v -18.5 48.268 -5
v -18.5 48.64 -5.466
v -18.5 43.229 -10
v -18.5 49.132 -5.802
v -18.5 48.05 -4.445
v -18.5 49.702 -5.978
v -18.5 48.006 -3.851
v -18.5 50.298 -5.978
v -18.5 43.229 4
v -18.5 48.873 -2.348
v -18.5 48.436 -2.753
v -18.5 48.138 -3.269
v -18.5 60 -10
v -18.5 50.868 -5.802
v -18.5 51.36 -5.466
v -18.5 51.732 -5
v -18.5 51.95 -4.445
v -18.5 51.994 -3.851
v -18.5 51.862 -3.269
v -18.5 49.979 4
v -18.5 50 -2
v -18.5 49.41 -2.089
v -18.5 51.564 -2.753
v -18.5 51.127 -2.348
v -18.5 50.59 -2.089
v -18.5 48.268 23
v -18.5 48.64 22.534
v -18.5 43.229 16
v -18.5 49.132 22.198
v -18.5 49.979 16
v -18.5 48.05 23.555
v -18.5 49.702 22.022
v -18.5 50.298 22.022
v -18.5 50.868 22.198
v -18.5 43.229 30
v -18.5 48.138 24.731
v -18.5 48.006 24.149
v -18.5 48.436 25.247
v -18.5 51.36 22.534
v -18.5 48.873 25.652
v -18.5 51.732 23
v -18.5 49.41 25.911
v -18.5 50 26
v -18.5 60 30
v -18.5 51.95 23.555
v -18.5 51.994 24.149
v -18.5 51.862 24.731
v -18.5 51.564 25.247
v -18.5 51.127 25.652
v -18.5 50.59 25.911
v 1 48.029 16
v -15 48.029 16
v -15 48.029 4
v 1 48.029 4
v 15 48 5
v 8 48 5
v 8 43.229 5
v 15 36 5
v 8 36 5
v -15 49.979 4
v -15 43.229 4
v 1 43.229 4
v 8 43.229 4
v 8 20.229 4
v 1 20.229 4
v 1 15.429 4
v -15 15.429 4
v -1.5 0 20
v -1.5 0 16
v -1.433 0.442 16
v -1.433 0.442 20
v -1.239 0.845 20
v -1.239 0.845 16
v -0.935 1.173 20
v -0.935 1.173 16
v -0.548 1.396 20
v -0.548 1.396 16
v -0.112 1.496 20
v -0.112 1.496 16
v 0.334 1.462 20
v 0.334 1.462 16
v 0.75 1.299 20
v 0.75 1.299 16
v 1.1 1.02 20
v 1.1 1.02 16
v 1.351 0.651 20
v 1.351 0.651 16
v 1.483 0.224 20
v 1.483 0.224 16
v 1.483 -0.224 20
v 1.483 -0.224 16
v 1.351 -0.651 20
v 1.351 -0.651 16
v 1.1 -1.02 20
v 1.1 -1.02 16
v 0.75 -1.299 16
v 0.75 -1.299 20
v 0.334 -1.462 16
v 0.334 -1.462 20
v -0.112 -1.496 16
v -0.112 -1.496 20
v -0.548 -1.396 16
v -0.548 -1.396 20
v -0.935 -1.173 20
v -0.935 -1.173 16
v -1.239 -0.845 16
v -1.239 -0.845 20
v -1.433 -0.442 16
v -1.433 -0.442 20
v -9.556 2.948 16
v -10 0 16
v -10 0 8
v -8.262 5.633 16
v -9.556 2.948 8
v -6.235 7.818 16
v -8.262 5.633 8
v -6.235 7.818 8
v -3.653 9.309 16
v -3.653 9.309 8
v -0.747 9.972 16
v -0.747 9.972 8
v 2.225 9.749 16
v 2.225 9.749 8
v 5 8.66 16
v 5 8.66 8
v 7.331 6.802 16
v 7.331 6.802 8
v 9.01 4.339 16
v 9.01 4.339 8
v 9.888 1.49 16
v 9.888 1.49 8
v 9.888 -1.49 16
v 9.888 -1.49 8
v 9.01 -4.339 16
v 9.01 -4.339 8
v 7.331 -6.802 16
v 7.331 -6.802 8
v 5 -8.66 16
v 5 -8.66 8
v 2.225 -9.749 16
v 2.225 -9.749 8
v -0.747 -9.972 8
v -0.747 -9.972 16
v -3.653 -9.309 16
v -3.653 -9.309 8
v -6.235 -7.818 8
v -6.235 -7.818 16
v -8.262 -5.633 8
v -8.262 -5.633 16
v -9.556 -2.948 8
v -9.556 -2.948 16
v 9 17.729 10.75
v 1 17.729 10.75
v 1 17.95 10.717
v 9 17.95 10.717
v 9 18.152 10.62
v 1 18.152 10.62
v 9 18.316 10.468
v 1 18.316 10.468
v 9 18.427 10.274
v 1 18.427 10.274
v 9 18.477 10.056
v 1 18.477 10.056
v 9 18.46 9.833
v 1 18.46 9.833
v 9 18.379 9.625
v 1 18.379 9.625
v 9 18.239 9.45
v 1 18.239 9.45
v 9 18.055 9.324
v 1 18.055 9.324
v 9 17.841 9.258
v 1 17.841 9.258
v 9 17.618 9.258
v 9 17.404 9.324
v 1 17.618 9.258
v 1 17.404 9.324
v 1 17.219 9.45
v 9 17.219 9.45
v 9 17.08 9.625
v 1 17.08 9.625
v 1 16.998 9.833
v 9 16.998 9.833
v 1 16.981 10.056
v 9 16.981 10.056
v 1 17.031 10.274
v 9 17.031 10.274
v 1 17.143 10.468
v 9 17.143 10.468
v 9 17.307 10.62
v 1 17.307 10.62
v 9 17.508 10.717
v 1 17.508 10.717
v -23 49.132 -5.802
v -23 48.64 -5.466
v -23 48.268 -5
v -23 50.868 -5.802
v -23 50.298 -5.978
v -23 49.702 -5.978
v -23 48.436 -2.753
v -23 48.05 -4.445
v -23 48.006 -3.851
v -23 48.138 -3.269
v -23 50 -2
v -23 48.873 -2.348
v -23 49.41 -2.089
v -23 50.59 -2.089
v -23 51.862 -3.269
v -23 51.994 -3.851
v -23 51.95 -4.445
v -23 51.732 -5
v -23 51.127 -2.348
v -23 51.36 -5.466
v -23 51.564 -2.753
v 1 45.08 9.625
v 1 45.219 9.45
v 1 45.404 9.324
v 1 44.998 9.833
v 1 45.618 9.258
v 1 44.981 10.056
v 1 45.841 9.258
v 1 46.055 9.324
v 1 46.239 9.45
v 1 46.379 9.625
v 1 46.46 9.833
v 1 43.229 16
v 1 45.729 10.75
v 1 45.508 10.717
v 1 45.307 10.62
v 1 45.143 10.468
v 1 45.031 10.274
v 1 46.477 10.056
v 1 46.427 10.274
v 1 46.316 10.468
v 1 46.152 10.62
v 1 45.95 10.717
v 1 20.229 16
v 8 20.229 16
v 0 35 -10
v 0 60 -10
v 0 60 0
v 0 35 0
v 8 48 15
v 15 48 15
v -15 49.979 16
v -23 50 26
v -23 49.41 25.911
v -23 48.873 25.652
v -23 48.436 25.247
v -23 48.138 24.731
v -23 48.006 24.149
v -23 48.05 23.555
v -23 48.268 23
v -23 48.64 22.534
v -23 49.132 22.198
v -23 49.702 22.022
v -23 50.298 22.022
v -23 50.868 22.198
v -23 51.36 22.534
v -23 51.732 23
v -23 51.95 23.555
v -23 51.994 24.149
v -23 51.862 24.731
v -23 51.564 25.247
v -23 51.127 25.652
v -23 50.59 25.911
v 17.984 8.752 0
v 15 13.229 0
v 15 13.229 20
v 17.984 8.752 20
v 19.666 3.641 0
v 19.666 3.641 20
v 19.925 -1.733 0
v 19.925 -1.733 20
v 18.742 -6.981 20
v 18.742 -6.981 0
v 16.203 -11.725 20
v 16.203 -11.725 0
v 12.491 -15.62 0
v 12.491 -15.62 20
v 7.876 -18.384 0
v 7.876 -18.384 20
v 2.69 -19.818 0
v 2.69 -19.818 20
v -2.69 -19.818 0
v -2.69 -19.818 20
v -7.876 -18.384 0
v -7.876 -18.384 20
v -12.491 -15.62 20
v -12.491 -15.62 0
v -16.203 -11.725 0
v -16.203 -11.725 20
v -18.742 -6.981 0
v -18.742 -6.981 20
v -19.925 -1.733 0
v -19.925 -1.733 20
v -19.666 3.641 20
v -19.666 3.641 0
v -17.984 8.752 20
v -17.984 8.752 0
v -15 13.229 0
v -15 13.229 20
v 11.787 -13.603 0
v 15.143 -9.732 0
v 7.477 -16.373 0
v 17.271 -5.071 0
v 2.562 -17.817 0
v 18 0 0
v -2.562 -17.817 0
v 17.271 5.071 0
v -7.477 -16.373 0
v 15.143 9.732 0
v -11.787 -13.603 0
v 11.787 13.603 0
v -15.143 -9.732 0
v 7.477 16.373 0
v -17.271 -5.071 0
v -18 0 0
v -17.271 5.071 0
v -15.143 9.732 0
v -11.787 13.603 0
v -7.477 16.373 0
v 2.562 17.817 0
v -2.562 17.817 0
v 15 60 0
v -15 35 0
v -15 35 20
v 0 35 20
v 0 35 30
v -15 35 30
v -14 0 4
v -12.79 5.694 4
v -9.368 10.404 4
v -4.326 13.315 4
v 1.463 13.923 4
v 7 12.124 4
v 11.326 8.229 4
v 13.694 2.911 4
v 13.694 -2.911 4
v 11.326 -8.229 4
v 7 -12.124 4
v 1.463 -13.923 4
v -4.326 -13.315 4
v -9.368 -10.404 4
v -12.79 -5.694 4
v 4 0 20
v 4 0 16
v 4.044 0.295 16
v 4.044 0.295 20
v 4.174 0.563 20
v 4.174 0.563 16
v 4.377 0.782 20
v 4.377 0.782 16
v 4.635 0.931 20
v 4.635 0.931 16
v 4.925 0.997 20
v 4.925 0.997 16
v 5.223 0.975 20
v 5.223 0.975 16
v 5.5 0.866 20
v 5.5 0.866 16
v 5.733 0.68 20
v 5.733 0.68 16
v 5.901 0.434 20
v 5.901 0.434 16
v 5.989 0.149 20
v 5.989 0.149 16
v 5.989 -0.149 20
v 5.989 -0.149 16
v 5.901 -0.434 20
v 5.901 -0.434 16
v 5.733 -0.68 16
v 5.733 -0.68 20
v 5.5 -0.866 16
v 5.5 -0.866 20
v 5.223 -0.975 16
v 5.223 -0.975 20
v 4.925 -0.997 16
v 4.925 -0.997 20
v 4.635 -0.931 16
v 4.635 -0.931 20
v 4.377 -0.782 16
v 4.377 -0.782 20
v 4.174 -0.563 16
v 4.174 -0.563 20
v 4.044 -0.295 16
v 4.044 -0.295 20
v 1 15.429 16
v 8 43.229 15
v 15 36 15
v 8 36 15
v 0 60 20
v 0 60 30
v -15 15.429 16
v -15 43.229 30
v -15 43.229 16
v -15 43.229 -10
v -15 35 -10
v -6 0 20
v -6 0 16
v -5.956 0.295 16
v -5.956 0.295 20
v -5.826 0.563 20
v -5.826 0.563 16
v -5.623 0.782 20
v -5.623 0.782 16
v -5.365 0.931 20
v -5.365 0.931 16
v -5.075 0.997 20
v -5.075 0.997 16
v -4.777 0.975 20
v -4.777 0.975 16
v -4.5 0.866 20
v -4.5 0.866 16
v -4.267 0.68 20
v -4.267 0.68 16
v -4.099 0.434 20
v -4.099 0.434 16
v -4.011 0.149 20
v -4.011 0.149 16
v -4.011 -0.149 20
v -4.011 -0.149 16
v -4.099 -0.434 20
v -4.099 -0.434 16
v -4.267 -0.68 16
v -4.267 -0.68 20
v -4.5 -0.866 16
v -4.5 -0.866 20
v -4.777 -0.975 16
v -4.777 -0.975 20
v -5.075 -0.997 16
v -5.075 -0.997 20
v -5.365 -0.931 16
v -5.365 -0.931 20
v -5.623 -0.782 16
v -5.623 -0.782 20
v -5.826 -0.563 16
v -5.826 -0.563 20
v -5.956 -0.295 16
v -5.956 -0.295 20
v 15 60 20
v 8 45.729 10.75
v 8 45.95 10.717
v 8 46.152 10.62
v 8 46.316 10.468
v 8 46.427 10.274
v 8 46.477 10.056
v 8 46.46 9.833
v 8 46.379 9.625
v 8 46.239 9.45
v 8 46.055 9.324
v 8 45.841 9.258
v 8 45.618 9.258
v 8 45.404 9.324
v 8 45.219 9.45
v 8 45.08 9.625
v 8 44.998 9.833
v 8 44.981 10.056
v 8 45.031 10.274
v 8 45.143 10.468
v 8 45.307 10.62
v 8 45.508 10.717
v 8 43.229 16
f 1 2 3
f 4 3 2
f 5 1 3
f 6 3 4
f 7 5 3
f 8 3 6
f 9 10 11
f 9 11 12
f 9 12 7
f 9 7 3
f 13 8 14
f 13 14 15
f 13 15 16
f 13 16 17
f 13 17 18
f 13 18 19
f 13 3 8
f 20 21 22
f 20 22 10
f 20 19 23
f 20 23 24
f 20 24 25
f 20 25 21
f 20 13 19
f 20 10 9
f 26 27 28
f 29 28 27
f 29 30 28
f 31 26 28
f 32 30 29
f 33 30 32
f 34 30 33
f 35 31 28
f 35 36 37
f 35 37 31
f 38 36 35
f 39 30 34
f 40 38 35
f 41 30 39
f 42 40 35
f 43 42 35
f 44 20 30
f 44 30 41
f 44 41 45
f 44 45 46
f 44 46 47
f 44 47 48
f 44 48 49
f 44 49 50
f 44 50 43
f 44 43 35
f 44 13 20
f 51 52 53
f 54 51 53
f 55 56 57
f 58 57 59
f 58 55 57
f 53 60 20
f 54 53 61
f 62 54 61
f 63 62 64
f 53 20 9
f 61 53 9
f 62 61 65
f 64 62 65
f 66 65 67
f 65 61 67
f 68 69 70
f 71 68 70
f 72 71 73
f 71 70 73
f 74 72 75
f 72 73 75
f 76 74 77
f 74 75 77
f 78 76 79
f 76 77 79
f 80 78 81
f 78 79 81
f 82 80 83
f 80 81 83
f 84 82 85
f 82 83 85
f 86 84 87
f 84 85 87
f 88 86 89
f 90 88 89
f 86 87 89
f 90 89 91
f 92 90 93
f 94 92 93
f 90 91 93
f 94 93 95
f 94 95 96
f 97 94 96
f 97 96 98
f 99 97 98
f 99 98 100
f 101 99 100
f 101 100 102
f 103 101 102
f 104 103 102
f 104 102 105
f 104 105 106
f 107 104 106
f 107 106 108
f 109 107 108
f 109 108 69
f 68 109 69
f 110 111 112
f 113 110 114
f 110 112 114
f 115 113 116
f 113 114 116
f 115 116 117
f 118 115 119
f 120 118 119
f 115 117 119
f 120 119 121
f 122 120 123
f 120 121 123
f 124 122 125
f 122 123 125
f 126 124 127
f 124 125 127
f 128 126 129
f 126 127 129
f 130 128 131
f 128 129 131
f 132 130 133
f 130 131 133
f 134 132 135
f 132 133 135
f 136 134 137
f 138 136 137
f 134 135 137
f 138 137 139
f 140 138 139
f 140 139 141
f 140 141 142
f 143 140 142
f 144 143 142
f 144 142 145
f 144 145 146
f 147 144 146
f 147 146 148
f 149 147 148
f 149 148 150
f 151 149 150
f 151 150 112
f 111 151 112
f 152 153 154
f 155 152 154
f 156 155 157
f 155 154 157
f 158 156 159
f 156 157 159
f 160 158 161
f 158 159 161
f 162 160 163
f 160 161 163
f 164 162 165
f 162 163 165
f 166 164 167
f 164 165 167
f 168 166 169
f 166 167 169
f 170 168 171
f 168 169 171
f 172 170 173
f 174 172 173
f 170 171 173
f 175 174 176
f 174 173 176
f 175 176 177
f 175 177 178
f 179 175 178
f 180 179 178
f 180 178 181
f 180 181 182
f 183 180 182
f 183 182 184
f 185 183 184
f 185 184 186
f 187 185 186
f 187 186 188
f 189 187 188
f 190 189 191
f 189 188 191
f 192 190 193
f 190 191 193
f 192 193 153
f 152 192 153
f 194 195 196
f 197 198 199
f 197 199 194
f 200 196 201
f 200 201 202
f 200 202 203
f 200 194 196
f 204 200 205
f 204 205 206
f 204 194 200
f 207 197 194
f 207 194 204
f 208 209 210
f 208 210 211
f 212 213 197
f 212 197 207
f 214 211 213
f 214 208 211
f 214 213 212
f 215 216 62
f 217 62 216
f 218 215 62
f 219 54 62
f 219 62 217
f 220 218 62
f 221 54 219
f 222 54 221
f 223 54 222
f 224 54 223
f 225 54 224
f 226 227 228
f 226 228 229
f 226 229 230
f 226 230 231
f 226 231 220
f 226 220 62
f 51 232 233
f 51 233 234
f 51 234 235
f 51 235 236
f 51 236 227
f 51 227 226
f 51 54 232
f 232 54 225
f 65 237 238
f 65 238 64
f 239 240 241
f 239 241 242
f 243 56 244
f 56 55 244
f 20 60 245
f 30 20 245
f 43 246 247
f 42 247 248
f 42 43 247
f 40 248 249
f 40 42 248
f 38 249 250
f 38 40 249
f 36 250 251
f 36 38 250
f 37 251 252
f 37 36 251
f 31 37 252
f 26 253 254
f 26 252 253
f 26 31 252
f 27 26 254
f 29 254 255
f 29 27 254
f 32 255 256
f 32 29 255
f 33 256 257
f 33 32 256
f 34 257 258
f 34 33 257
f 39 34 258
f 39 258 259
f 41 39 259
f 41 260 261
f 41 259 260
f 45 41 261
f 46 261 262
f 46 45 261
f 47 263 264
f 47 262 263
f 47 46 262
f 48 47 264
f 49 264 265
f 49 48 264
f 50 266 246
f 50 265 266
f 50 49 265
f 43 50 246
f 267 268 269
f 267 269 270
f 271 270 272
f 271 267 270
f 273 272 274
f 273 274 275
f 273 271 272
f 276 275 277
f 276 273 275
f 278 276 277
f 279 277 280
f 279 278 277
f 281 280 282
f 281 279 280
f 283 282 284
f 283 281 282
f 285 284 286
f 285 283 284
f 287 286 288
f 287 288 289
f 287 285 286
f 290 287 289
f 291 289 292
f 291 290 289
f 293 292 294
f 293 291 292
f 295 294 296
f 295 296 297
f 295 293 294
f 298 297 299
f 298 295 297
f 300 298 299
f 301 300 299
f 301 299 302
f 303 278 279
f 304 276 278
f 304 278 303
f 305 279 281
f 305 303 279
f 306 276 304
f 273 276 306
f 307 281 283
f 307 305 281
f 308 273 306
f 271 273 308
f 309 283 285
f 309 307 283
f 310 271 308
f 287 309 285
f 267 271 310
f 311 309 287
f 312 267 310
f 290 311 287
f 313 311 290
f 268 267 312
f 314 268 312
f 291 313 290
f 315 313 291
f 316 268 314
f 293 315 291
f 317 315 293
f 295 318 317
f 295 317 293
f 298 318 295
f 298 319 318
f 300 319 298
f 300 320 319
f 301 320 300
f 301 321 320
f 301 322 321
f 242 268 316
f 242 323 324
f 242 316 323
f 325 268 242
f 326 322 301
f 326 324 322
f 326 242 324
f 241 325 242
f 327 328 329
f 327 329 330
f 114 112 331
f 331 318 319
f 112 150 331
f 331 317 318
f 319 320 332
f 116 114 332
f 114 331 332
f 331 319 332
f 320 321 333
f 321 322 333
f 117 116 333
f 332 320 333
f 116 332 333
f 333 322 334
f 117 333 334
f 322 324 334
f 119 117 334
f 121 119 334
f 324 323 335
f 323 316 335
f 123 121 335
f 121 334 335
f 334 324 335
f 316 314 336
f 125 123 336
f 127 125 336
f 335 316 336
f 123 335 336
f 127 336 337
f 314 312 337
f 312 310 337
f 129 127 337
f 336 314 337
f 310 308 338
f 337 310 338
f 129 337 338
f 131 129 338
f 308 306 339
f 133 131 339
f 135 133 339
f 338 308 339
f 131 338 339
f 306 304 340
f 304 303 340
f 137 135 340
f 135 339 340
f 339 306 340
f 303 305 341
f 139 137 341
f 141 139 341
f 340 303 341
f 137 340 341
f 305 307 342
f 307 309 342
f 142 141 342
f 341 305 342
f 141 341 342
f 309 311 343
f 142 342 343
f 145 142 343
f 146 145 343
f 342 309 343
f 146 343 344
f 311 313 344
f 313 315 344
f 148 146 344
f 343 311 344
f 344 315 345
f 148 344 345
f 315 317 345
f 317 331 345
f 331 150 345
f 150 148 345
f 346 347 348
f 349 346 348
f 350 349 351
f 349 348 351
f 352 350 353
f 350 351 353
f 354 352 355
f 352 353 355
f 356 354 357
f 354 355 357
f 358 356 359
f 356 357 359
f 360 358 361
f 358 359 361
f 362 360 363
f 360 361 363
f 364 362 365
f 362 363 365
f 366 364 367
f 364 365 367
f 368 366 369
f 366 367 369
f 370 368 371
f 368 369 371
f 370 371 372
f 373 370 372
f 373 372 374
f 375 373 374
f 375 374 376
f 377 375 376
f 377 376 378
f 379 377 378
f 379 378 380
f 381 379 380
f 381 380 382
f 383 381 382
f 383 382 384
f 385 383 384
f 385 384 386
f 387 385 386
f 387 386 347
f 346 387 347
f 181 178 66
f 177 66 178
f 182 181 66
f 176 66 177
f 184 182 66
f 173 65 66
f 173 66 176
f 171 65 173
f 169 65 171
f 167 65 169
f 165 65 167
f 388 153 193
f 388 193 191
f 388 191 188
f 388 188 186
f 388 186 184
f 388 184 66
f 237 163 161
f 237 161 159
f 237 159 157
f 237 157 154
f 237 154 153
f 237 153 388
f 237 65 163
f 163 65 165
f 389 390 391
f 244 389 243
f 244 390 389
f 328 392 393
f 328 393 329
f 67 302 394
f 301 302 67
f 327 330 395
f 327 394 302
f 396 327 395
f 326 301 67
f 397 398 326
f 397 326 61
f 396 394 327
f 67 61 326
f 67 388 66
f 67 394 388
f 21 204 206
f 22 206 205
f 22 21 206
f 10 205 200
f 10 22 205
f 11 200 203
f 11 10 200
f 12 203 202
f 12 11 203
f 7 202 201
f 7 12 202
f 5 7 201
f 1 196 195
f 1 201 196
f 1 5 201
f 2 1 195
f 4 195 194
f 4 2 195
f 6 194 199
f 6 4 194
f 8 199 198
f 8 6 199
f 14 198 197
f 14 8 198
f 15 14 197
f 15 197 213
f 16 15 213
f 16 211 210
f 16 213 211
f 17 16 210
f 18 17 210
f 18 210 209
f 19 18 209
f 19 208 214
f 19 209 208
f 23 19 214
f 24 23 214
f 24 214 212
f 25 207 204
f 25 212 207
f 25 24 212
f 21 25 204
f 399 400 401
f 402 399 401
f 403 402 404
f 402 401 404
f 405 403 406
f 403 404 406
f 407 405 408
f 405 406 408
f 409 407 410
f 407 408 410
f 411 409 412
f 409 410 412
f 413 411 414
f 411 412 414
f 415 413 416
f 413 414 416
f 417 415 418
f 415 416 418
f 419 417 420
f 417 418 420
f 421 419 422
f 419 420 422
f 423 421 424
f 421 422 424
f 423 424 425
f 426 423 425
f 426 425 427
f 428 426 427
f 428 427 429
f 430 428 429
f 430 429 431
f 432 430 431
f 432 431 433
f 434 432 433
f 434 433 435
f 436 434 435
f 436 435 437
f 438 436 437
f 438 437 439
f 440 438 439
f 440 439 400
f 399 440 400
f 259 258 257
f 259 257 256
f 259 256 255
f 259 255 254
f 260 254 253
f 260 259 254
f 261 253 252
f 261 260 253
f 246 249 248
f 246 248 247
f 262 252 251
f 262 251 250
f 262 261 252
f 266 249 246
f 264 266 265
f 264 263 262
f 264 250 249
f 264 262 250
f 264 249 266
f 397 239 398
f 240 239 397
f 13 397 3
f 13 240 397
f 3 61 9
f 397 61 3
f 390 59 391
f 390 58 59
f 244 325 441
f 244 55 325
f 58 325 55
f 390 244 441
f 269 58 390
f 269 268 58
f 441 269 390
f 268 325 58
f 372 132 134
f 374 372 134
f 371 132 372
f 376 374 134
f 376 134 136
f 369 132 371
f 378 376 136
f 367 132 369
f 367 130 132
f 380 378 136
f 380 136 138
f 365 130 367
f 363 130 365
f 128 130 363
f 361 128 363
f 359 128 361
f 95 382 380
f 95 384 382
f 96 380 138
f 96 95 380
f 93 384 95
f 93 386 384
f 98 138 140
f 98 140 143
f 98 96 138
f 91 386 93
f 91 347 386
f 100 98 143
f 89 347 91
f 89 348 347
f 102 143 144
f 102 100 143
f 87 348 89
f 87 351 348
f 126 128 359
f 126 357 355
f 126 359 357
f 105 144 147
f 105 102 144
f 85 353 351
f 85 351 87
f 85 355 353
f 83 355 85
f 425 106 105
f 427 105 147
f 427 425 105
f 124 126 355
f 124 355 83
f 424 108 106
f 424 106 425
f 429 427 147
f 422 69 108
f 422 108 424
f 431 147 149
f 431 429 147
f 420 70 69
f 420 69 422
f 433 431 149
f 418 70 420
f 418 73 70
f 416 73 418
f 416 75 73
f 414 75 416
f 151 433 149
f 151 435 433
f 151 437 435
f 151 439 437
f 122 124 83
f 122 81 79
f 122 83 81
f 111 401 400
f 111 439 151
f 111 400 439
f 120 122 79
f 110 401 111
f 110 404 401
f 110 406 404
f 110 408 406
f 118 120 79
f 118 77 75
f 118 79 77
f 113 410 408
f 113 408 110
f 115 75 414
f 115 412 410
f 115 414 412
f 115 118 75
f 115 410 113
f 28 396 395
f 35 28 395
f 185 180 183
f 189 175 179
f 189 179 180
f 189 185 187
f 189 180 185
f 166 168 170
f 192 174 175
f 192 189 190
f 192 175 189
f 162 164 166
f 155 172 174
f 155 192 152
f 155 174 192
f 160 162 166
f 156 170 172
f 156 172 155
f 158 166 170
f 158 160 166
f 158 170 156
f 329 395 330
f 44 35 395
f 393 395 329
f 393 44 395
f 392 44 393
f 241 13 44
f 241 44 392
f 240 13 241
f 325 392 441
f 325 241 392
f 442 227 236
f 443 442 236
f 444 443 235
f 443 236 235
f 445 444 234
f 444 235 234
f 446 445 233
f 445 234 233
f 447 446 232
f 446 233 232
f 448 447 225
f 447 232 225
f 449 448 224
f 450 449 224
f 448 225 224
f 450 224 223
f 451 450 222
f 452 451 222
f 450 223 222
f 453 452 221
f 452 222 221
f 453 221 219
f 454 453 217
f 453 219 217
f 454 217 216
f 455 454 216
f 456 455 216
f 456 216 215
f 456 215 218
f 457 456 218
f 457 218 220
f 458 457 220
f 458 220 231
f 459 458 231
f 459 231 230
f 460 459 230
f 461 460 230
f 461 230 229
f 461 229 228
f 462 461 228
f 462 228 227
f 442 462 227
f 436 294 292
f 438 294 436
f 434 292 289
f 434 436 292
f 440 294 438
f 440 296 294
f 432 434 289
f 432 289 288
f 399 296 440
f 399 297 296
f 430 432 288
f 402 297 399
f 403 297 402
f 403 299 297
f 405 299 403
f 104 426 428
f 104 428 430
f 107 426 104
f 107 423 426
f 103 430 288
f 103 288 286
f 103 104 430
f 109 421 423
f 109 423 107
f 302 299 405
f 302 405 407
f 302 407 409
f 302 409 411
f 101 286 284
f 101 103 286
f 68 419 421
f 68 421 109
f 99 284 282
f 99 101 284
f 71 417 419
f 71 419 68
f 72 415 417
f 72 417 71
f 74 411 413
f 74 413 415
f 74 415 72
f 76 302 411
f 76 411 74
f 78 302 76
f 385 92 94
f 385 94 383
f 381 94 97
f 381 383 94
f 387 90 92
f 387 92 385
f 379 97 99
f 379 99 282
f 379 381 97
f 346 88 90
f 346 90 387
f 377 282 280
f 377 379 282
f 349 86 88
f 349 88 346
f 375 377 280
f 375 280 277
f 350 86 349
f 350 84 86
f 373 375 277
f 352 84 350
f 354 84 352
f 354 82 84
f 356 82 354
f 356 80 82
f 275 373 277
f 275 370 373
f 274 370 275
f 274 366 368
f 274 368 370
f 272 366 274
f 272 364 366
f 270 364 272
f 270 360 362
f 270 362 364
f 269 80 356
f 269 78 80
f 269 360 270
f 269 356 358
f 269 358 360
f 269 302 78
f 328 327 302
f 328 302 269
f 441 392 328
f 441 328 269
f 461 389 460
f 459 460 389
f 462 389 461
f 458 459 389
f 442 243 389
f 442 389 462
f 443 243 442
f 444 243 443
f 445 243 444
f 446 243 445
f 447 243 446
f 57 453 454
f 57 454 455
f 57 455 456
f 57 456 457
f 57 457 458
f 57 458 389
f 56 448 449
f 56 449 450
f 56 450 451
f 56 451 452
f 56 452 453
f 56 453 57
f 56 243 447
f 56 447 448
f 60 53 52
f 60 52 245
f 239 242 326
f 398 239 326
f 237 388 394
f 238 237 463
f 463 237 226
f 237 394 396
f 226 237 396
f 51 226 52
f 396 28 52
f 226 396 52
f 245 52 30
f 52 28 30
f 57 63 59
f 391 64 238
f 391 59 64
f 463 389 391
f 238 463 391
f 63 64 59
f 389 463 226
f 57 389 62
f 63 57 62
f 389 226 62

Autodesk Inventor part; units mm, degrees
ref_plane "YZ Plane" through (0, 0, 0) normal (1, 0, 0) x (0, 1, 0)
ref_plane "XZ Plane" through (0, 0, 0) normal (0, 1, 0) x (-1, 0, 0)
ref_plane "XY Plane" through (0, 0, 0) normal (0, 0, 1) x (1, 0, 0)
sketch "Sketch1" plane through (0, 0, 0) normal (0, 0, 1) x (1, 0, 0)
  circle A0 centre (0, 0) radius 10
  circle A1 centre (0, 0) radius 20
  line L0 (-15, 0) -> (15, 0)
  line L1 (15, 0) -> (15, 50)
  line L2 (15, 50) -> (-15, 50)
  line L3 (-15, 50) -> (-15, 0)
  point P0 (-15, 13.2288)
  point P1 (15, 13.2288)
  dimension "d0" = 20
  dimension "d1" = 40
  dimension "d2" = 30
  dimension "d3" = 50
extrude "Extrusion1" add sketch "Sketch1" along normal blind 20
sketch "Sketch2" plane through (0, 0, 20) normal (0, 0, 1) x (1, 0, 0)
  circle A0 centre (0, 0) radius 10
  dimension "d6" = 20
extrude "Extrusion2" cut sketch "Sketch2" against normal blind 15
sketch "Sketch4" plane through (-15, 13.2288, 0) normal (-1, 0, 0) x (0, 0, 1)
  line L0 (0, 36.7712) -> (20, 36.7712) projected
  line L1 (0, 0) -> (0, 36.7712) projected
  line L2 (20, 36.7712) -> (0, 36.7712)
  line L3 (0, 36.7712) -> (0, 0)
  line L4 (0, 0) -> (20, 0)
  line L5 (20, 0) -> (20, 36.7712)
  line L6 (0, 0) -> (20, 0) projected
  line L7 (20, 36.7712) -> (10, 36.7712)
  line L8 (10, 36.7712) -> (10, 0)
  line L9 (10, 0) -> (20, 0)
  line L10 (20, 0) -> (20, 36.7712)
  line L11 (10, 0) -> (16, 0)
  line L12 (16, 0) -> (16, 25)
  line L13 (16, 25) -> (10, 25)
  line L14 (10, 25) -> (10, 0)
  line L15 (10, 25) -> (4, 25)
  line L16 (4, 25) -> (4, 0)
  line L17 (4, 0) -> (10, 0)
  line L18 (10, 0) -> (10, 25)
  line L19 (4, 25) -> (16, 25)
  line L20 (16, 25) -> (16, 30.0005)
  line L21 (16, 30.0005) -> (4, 30.0005)
  line L22 (4, 30.0005) -> (4, 25)
  line L23 (4, 30.0005) -> (16, 30.0005)
  line L24 (16, 30.0005) -> (16, 7.0005)
  line L25 (16, 7.0005) -> (4, 7.0005)
  line L26 (4, 7.0005) -> (4, 30.0005)
  line L27 (10, 7.0005) -> (16, 7.0005)
  line L28 (16, 7.0005) -> (16, 0)
  line L29 (16, 0) -> (10, 0)
  line L30 (10, 0) -> (10, 7.0005)
  point P0 (0, -13.2288)
  dimension "d13" = 6
  dimension "d14" = 25
  dimension "d15" = 6
  dimension "d16" = 23
extrude "Extrusion3" cut sketch "Sketch4" against normal blind 23 contours L21 L20 L13 L8 | L8 L15 L22 L21 | L13 L12 L25 L8 | L8 L25 L16 L15
sketch "Sketch6" plane through (-15, 13.2288, 0) normal (-1, 0, 0) x (0, 0, 1)
  line L0 (4, 7.0005) -> (4, 30.0005) projected
  line L1 (4, 7.0005) -> (16, 7.0005)
  line L2 (16, 7.0005) -> (16, 2.2005)
  line L3 (16, 2.2005) -> (4, 2.2005)
  line L4 (4, 2.2005) -> (4, 7.0005)
  line L5 (4, 30.0005) -> (16, 30.0005)
  line L6 (16, 30.0005) -> (16, 34.8005)
  line L7 (16, 34.8005) -> (4, 34.8005)
  line L8 (4, 34.8005) -> (4, 30.0005)
  point P0 (0, -13.2288)
  dimension "d19" = 12
  dimension "d20" = 4.8
  dimension "d21" = 4.8
extrude "Extrusion4" cut sketch "Sketch6" against normal blind 16
sketch "Sketch7" plane through (1, 13.2288, 0) normal (-1, 0, 0) x (0, 0, 1)
  line L0 (4, 30.0005) -> (16, 30.0005) projected
  line L1 (4, 30.0005) -> (10, 30.0005)
  line L2 (10, 30.0005) -> (10, 32.5005)
  line L3 (10, 32.5005) -> (4, 32.5005)
  line L4 (4, 32.5005) -> (4, 30.0005)
  circle A0 centre (10, 32.5005) radius 0.75
  line L5 (16, 7.0005) -> (4, 7.0005) projected
  line L6 (16, 7.0005) -> (16, 2.2005) projected
  line L7 (4, 7.0005) -> (16, 7.0005)
  line L8 (16, 7.0005) -> (16, 4.5005)
  line L9 (16, 4.5005) -> (4, 4.5005)
  line L10 (4, 4.5005) -> (4, 7.0005)
  line L11 (10, 4.5005) -> (4, 4.5005)
  line L12 (4, 4.5005) -> (4, 7.0005)
  line L13 (4, 7.0005) -> (10, 7.0005)
  line L14 (10, 7.0005) -> (10, 4.5005)
  circle A1 centre (10, 4.5005) radius 0.75
  point P0 (0, -13.2288)
  dimension "d24" = 2.5
  dimension "d25" = 1.5
  dimension "d26" = 2.5
  dimension "d27" = 1.5
extrude "Extrusion5" cut sketch "Sketch7" against normal blind 8 contours A0 L3 L2 | L2 L3 A0 | A1 L9 L14 | L14 L9 A1 | A1 L9
sketch "Sketch8" plane through (15, 13.2288, 0) normal (1, 0, 0) x (0, 0, -1)
  line L0 (0, 36.7712) -> (0, 0) projected
  line L1 (-20, 36.7712) -> (-20, 0) projected
  line L2 (0, 36.7712) -> (-20, 36.7712)
  line L3 (-20, 36.7712) -> (-20, 26.7712)
  line L4 (-20, 26.7712) -> (0, 26.7712)
  line L5 (0, 26.7712) -> (0, 36.7712)
  line L6 (0, 26.7712) -> (-20, 26.7712)
  line L7 (-20, 26.7712) -> (-20, 18.7712)
  line L8 (-20, 18.7712) -> (0, 18.7712)
  line L9 (0, 18.7712) -> (0, 26.7712)
  line L10 (0, 26.7712) -> (-10, 26.7712)
  line L11 (-10, 26.7712) -> (-10, 18.7712)
  line L12 (-10, 18.7712) -> (0, 18.7712)
  line L13 (0, 18.7712) -> (0, 26.7712)
  line L14 (-10, 26.7712) -> (-5, 26.7712)
  line L15 (-5, 26.7712) -> (-5, 22.7712)
  line L16 (-5, 22.7712) -> (-10, 22.7712)
  line L17 (-10, 22.7712) -> (-10, 26.7712)
  line L18 (-10, 22.7712) -> (-15, 22.7712)
  line L19 (-15, 22.7712) -> (-15, 26.7712)
  line L20 (-15, 26.7712) -> (-10, 26.7712)
  line L21 (-10, 26.7712) -> (-10, 22.7712)
  point P0 (0, -13.2288)
  dimension "d30" = 10
  dimension "d31" = 8
  dimension "d32" = 5
  dimension "d33" = 5
extrude "Extrusion6" cut sketch "Sketch8" against normal blind 15.8125 contours L15 L16 L11 L4 | L11 L18 L19 L4
sketch "Sketch9" plane through (0, 0, 5) normal (0, 0, 1) x (1, 0, 0)
  circle A0 centre (0, 0) radius 1
  circle A1 centre (7, 0) radius 1.5
  circle A2 centre (0, 0) radius 1.5
  circle A3 centre (-7, 0) radius 1.5
  dimension "d36" = 2
  dimension "d37" = 3
  dimension "d38" = 3
  dimension "d39" = 3
extrude "Extrusion7" cut sketch "Sketch9" against normal blind 8 contours A0 | A1 | A2 | A3
sketch "Sketch10" plane through (-15, 50, 0) normal (0, 1, 0) x (1, 0, 0)
  line L0 (0, 0) -> (0, -20) projected
  line L1 (0, 0) -> (29.4792, 0)
  line L2 (29.4792, 0) -> (29.4792, -20)
  line L3 (29.4792, -20) -> (0, -20)
  line L4 (0, -20) -> (0, 0)
  point P0 (15, 0)
extrude "Extrusion8" add sketch "Sketch10" along normal blind 10
sketch "Sketch11" plane through (0, 0, 0) normal (0, 0, -1) x (-1, 0, 0)
  line L0 (15, 13.2288) -> (15, 60) projected
  line L1 (-15, 13.2288) -> (-15, 50) projected
  line L2 (15, 60) -> (-15, 60)
  line L3 (-15, 60) -> (-15, 45)
  line L4 (-15, 45) -> (15, 45)
  line L5 (15, 45) -> (15, 60)
  line L6 (15, 45) -> (-15, 45)
  line L7 (-15, 45) -> (-15, 35)
  line L8 (-15, 35) -> (15, 35)
  line L9 (15, 35) -> (15, 45)
  point P0 (0, 0)
  dimension "d47" = 15
  dimension "d48" = 10
sketch "Sketch12" plane through (14.4792, 50, 20) normal (1, 0, 0) x (0, 0, -1)
  line L0 (20, 0) -> (20, 10) projected
  line L1 (0, 0) -> (20, 0)
  line L2 (20, 0) -> (20, 10)
  line L3 (20, 10) -> (0, 10)
  line L4 (0, 10) -> (0, 0)
  point P0 (20, -50)
extrude "Extrusion9" cut sketch "Sketch12" against normal blind 59.6125
sketch "Sketch13" plane through (-15, 50, 0) normal (0, 1, 0) x (1, 0, 0)
  line L0 (30, 0) -> (30, -20) projected
  line L1 (0, 0) -> (30, 0)
  line L2 (30, 0) -> (30, -20)
  line L3 (30, -20) -> (0, -20)
  line L4 (0, -20) -> (0, 0)
  point P0 (15, 0)
extrude "Extrusion10" add sketch "Sketch13" along normal blind 10
extrude "Extrusion11" add sketch "Sketch11" along normal blind 10
sketch "Sketch15" plane through (0, 0, 20) normal (0, 0, 1) x (1, 0, 0)
  line L0 (-15, 60) -> (15, 60) projected
  line L1 (-15, 60) -> (0, 60)
  line L2 (0, 60) -> (0, 35)
  line L3 (0, 35) -> (-15, 35)
  line L4 (-15, 35) -> (-15, 60)
  point P0 (0, 0)
  dimension "d56" = 25
extrude "Extrusion12" add sketch "Sketch15" along normal blind 10
sketch "Sketch16" plane through (0, 0, -10) normal (0, 0, -1) x (-1, 0, 0)
  line L0 (-15, 13.2288) -> (-15, 60) projected
  line L1 (0, 35) -> (15, 35) projected
  line L2 (-15, 60) -> (0, 60)
  line L3 (0, 60) -> (0, 35)
  line L4 (0, 35) -> (-15, 35)
  line L5 (-15, 35) -> (-15, 60)
  point P0 (0, 0)
extrude "Extrusion13" cut sketch "Sketch16" against normal blind 10
sketch "Sketch17" plane through (-15, 13.2288, 0) normal (-1, 0, 0) x (0, 0, 1)
  line L0 (0, 0) -> (0, 46.7712) projected
  line L1 (0, 46.7712) -> (10, 46.7712)
  line L2 (10, 46.7712) -> (10, 23.4712)
  line L3 (10, 23.4712) -> (0, 23.4712)
  line L4 (0, 23.4712) -> (0, 46.7712)
  circle A0 centre (10, 23.4712) radius 10
  line L5 (20, 46.7712) -> (30, 46.7712) projected
  line L6 (20, 0) -> (20, 46.7712) projected
  line L7 (30, 46.7712) -> (20, 46.7712)
  line L8 (20, 46.7712) -> (20, 36.7712)
  line L9 (20, 36.7712) -> (30, 36.7712)
  line L10 (30, 36.7712) -> (30, 46.7712)
  line L11 (30, 46.7712) -> (24, 46.7712)
  line L12 (24, 46.7712) -> (24, 36.7712)
  line L13 (24, 36.7712) -> (30, 36.7712)
  line L14 (30, 36.7712) -> (30, 46.7712)
  circle A1 centre (24, 36.7712) radius 2
  line L15 (30, 46.7712) -> (-10, 46.7712) projected
  line L16 (-10, 46.7712) -> (-4, 46.7712)
  line L17 (-4, 46.7712) -> (-4, 36.7712)
  line L18 (-4, 36.7712) -> (-10, 36.7712)
  line L19 (-10, 36.7712) -> (-10, 46.7712)
  circle A2 centre (-4, 36.7712) radius 2
  point P0 (0, -13.2288)
  dimension "d61" = 23.3
  dimension "d62" = 20
  dimension "d63" = 10
  dimension "d64" = 6
  dimension "d65" = 4
  dimension "d66" = 6
  dimension "d67" = 4
extrude "Extrusion14" add sketch "Sketch17" along normal blind 8 contours A2 L18 L17 | L17 L18 A2 | A1 L12 L9 | L9 A1 | L12 A1 L9
sketch "Sketch18" plane through (0, 0, 20) normal (0, 0, 1) x (1, 0, 0)
  circle A0 centre (0, 0) radius 10
extrude "Extrusion15" add sketch "Sketch18" against normal blind 16
sketch "Sketch19" plane through (0, 0, 0) normal (0, 0, -1) x (-1, 0, 0)
  circle A0 centre (0, 0) radius 1.5 projected
  circle A1 centre (0, 0) radius 10
  dimension "d72" = 20
extrude "Extrusion16" cut sketch "Sketch19" against normal blind 16
sketch "Sketch20" plane through (0, 0, 4) normal (0, 0, -1) x (-1, 0, 0)
  circle A0 centre (0, 0) radius 1.5 projected
  circle A1 centre (0, 0) radius 1.5
extrude "Extrusion17" cut sketch "Sketch20" against normal blind 30.0375
sketch "Sketch21" plane through (0, 0, 16) normal (0, 0, -1) x (-1, 0, 0)
  circle A0 centre (5, 0) radius 1
  circle A1 centre (-5, 0) radius 1
  point P0 (0, 0)
  dimension "d77" = 2
  dimension "d78" = 2
extrude "Extrusion18" cut sketch "Sketch21" against normal blind 138.2375
chamfer "Chamfer2" distance 8 angle 45 1 edges at (10, 0, 0)
sketch "Sketch22" plane through (-15, 13.2288, 0) normal (-1, 0, 0) x (0, 0, 1)
  circle A0 centre (-4, 36.7712) radius 2 projected
  circle A1 centre (-4, 36.7712) radius 2
  circle A2 centre (24, 36.7712) radius 2 projected
  circle A3 centre (24, 36.7712) radius 2
  point P0 (0, -13.2288)
sketch "Sketch25" plane through (-15, 13.2288, 0) normal (-1, 0, 0) x (0, 0, 1)
  circle A0 centre (-4, 36.7712) radius 2 projected
  circle A1 centre (-4, 36.7712) radius 8
  arc A2 (7.7087, 23.1005) -> (12.2913, 23.1005) centre (10, 24.1005) ccw projected
  circle A3 centre (10, 24.1005) radius 8
  circle A4 centre (24, 36.7712) radius 2 projected
  circle A5 centre (24, 36.7712) radius 8
  circle A6 centre (-4, 36.7712) radius 2
  circle A7 centre (24, 36.7712) radius 2
  line L0 (-4, 36.7712) -> (24.7591, 36.7712)
  line L1 (24.7591, 36.7712) -> (24.7591, 61.7712)
  line L2 (24.7591, 61.7712) -> (-4, 61.7712)
  line L3 (-4, 61.7712) -> (-4, 36.7712)
  point P0 (0, -13.2288)
  dimension "d92" = 16
  dimension "d93" = 16
  dimension "d94" = 16
  dimension "d99" = 25
sketch "Sketch29" plane through (-15, 15.4292, 4) normal (0, 0, 1) x (1, 0, 0)
  point P0 (15, -15.4292)
sketch "Sketch30" plane through (-23, 50, -4) normal (-1, 0, 0) x (0, 0, 1)
  circle A0 centre (0, 0) radius 2
  circle A1 centre (28, 0) radius 2 projected
  circle A2 centre (28, 0) radius 2
  point P0 (4, -50)
extrude "Extrusion24" add sketch "Sketch30" along normal blind 8
sketch "Sketch33" plane through (15, 13.2288, 20) normal (1, 0, 0) x (0, 0, -1)
  line L0 (5, 26.7712) -> (5, 22.7712) projected
  line L1 (5, 26.7712) -> (15, 26.7712)
  line L2 (15, 26.7712) -> (15, 34.7712)
  line L3 (15, 34.7712) -> (5, 34.7712)
  line L4 (5, 34.7712) -> (5, 26.7712)
  point P0 (20, -13.2288)
  dimension "d110" = 10
  dimension "d111" = 8
extrude "Extrusion27" cut sketch "Sketch33" against normal blind 7
sketch "Sketch34" plane through (0, 0, 30) normal (0, 0, 1) x (1, 0, 0)
  point P0 (0, 0)
sketch "Sketch35" plane through (-15, 13.2288, 0) normal (-1, 0, 0) x (0, 0, 1)
  line L0 (0, 46.7712) -> (-10, 46.7712) projected
  line L1 (-10, 46.7712) -> (4, 46.7712)
  line L2 (4, 46.7712) -> (4, 30.0005)
  line L3 (4, 30.0005) -> (-10, 30.0005)
  line L4 (-10, 30.0005) -> (-10, 46.7712)
  line L5 (30, 46.7712) -> (30, 21.7712) projected
  line L6 (30, 46.7712) -> (16, 46.7712)
  line L7 (16, 46.7712) -> (16, 30.0005)
  line L8 (16, 30.0005) -> (30, 30.0005)
  line L9 (30, 30.0005) -> (30, 46.7712)
  line L10 (4, 36.7498) -> (16, 36.7498)
  line L11 (16, 36.7498) -> (16, 46.7712)
  line L12 (16, 46.7712) -> (4, 46.7712)
  line L13 (4, 46.7712) -> (4, 36.7498)
  point P0 (0, -13.2288)
extrude "Extrusion28" add sketch "Sketch35" along normal blind 3.5
sketch "Sketch36" plane through (-31, 50, 24) normal (-1, 0, 0) x (0, 0, 1)
  circle A0 centre (-28, 0) radius 2 projected
  circle A1 centre (-28, 0) radius 2
  circle A2 centre (0, 0) radius 2
  point P0 (-24, -50)
extrude "Extrusion29" cut sketch "Sketch36" against normal blind 8
sketch "Sketch37" plane through (0, 0, 30) normal (0, 0, 1) x (1, 0, 0)
  point P0 (0, 0)
sketch "Sketch38" plane through (-15, 13.2288, 0) normal (-1, 0, 0) x (0, 0, 1)
  point P0 (0, -13.2288)
properties part number "EndConnector"
